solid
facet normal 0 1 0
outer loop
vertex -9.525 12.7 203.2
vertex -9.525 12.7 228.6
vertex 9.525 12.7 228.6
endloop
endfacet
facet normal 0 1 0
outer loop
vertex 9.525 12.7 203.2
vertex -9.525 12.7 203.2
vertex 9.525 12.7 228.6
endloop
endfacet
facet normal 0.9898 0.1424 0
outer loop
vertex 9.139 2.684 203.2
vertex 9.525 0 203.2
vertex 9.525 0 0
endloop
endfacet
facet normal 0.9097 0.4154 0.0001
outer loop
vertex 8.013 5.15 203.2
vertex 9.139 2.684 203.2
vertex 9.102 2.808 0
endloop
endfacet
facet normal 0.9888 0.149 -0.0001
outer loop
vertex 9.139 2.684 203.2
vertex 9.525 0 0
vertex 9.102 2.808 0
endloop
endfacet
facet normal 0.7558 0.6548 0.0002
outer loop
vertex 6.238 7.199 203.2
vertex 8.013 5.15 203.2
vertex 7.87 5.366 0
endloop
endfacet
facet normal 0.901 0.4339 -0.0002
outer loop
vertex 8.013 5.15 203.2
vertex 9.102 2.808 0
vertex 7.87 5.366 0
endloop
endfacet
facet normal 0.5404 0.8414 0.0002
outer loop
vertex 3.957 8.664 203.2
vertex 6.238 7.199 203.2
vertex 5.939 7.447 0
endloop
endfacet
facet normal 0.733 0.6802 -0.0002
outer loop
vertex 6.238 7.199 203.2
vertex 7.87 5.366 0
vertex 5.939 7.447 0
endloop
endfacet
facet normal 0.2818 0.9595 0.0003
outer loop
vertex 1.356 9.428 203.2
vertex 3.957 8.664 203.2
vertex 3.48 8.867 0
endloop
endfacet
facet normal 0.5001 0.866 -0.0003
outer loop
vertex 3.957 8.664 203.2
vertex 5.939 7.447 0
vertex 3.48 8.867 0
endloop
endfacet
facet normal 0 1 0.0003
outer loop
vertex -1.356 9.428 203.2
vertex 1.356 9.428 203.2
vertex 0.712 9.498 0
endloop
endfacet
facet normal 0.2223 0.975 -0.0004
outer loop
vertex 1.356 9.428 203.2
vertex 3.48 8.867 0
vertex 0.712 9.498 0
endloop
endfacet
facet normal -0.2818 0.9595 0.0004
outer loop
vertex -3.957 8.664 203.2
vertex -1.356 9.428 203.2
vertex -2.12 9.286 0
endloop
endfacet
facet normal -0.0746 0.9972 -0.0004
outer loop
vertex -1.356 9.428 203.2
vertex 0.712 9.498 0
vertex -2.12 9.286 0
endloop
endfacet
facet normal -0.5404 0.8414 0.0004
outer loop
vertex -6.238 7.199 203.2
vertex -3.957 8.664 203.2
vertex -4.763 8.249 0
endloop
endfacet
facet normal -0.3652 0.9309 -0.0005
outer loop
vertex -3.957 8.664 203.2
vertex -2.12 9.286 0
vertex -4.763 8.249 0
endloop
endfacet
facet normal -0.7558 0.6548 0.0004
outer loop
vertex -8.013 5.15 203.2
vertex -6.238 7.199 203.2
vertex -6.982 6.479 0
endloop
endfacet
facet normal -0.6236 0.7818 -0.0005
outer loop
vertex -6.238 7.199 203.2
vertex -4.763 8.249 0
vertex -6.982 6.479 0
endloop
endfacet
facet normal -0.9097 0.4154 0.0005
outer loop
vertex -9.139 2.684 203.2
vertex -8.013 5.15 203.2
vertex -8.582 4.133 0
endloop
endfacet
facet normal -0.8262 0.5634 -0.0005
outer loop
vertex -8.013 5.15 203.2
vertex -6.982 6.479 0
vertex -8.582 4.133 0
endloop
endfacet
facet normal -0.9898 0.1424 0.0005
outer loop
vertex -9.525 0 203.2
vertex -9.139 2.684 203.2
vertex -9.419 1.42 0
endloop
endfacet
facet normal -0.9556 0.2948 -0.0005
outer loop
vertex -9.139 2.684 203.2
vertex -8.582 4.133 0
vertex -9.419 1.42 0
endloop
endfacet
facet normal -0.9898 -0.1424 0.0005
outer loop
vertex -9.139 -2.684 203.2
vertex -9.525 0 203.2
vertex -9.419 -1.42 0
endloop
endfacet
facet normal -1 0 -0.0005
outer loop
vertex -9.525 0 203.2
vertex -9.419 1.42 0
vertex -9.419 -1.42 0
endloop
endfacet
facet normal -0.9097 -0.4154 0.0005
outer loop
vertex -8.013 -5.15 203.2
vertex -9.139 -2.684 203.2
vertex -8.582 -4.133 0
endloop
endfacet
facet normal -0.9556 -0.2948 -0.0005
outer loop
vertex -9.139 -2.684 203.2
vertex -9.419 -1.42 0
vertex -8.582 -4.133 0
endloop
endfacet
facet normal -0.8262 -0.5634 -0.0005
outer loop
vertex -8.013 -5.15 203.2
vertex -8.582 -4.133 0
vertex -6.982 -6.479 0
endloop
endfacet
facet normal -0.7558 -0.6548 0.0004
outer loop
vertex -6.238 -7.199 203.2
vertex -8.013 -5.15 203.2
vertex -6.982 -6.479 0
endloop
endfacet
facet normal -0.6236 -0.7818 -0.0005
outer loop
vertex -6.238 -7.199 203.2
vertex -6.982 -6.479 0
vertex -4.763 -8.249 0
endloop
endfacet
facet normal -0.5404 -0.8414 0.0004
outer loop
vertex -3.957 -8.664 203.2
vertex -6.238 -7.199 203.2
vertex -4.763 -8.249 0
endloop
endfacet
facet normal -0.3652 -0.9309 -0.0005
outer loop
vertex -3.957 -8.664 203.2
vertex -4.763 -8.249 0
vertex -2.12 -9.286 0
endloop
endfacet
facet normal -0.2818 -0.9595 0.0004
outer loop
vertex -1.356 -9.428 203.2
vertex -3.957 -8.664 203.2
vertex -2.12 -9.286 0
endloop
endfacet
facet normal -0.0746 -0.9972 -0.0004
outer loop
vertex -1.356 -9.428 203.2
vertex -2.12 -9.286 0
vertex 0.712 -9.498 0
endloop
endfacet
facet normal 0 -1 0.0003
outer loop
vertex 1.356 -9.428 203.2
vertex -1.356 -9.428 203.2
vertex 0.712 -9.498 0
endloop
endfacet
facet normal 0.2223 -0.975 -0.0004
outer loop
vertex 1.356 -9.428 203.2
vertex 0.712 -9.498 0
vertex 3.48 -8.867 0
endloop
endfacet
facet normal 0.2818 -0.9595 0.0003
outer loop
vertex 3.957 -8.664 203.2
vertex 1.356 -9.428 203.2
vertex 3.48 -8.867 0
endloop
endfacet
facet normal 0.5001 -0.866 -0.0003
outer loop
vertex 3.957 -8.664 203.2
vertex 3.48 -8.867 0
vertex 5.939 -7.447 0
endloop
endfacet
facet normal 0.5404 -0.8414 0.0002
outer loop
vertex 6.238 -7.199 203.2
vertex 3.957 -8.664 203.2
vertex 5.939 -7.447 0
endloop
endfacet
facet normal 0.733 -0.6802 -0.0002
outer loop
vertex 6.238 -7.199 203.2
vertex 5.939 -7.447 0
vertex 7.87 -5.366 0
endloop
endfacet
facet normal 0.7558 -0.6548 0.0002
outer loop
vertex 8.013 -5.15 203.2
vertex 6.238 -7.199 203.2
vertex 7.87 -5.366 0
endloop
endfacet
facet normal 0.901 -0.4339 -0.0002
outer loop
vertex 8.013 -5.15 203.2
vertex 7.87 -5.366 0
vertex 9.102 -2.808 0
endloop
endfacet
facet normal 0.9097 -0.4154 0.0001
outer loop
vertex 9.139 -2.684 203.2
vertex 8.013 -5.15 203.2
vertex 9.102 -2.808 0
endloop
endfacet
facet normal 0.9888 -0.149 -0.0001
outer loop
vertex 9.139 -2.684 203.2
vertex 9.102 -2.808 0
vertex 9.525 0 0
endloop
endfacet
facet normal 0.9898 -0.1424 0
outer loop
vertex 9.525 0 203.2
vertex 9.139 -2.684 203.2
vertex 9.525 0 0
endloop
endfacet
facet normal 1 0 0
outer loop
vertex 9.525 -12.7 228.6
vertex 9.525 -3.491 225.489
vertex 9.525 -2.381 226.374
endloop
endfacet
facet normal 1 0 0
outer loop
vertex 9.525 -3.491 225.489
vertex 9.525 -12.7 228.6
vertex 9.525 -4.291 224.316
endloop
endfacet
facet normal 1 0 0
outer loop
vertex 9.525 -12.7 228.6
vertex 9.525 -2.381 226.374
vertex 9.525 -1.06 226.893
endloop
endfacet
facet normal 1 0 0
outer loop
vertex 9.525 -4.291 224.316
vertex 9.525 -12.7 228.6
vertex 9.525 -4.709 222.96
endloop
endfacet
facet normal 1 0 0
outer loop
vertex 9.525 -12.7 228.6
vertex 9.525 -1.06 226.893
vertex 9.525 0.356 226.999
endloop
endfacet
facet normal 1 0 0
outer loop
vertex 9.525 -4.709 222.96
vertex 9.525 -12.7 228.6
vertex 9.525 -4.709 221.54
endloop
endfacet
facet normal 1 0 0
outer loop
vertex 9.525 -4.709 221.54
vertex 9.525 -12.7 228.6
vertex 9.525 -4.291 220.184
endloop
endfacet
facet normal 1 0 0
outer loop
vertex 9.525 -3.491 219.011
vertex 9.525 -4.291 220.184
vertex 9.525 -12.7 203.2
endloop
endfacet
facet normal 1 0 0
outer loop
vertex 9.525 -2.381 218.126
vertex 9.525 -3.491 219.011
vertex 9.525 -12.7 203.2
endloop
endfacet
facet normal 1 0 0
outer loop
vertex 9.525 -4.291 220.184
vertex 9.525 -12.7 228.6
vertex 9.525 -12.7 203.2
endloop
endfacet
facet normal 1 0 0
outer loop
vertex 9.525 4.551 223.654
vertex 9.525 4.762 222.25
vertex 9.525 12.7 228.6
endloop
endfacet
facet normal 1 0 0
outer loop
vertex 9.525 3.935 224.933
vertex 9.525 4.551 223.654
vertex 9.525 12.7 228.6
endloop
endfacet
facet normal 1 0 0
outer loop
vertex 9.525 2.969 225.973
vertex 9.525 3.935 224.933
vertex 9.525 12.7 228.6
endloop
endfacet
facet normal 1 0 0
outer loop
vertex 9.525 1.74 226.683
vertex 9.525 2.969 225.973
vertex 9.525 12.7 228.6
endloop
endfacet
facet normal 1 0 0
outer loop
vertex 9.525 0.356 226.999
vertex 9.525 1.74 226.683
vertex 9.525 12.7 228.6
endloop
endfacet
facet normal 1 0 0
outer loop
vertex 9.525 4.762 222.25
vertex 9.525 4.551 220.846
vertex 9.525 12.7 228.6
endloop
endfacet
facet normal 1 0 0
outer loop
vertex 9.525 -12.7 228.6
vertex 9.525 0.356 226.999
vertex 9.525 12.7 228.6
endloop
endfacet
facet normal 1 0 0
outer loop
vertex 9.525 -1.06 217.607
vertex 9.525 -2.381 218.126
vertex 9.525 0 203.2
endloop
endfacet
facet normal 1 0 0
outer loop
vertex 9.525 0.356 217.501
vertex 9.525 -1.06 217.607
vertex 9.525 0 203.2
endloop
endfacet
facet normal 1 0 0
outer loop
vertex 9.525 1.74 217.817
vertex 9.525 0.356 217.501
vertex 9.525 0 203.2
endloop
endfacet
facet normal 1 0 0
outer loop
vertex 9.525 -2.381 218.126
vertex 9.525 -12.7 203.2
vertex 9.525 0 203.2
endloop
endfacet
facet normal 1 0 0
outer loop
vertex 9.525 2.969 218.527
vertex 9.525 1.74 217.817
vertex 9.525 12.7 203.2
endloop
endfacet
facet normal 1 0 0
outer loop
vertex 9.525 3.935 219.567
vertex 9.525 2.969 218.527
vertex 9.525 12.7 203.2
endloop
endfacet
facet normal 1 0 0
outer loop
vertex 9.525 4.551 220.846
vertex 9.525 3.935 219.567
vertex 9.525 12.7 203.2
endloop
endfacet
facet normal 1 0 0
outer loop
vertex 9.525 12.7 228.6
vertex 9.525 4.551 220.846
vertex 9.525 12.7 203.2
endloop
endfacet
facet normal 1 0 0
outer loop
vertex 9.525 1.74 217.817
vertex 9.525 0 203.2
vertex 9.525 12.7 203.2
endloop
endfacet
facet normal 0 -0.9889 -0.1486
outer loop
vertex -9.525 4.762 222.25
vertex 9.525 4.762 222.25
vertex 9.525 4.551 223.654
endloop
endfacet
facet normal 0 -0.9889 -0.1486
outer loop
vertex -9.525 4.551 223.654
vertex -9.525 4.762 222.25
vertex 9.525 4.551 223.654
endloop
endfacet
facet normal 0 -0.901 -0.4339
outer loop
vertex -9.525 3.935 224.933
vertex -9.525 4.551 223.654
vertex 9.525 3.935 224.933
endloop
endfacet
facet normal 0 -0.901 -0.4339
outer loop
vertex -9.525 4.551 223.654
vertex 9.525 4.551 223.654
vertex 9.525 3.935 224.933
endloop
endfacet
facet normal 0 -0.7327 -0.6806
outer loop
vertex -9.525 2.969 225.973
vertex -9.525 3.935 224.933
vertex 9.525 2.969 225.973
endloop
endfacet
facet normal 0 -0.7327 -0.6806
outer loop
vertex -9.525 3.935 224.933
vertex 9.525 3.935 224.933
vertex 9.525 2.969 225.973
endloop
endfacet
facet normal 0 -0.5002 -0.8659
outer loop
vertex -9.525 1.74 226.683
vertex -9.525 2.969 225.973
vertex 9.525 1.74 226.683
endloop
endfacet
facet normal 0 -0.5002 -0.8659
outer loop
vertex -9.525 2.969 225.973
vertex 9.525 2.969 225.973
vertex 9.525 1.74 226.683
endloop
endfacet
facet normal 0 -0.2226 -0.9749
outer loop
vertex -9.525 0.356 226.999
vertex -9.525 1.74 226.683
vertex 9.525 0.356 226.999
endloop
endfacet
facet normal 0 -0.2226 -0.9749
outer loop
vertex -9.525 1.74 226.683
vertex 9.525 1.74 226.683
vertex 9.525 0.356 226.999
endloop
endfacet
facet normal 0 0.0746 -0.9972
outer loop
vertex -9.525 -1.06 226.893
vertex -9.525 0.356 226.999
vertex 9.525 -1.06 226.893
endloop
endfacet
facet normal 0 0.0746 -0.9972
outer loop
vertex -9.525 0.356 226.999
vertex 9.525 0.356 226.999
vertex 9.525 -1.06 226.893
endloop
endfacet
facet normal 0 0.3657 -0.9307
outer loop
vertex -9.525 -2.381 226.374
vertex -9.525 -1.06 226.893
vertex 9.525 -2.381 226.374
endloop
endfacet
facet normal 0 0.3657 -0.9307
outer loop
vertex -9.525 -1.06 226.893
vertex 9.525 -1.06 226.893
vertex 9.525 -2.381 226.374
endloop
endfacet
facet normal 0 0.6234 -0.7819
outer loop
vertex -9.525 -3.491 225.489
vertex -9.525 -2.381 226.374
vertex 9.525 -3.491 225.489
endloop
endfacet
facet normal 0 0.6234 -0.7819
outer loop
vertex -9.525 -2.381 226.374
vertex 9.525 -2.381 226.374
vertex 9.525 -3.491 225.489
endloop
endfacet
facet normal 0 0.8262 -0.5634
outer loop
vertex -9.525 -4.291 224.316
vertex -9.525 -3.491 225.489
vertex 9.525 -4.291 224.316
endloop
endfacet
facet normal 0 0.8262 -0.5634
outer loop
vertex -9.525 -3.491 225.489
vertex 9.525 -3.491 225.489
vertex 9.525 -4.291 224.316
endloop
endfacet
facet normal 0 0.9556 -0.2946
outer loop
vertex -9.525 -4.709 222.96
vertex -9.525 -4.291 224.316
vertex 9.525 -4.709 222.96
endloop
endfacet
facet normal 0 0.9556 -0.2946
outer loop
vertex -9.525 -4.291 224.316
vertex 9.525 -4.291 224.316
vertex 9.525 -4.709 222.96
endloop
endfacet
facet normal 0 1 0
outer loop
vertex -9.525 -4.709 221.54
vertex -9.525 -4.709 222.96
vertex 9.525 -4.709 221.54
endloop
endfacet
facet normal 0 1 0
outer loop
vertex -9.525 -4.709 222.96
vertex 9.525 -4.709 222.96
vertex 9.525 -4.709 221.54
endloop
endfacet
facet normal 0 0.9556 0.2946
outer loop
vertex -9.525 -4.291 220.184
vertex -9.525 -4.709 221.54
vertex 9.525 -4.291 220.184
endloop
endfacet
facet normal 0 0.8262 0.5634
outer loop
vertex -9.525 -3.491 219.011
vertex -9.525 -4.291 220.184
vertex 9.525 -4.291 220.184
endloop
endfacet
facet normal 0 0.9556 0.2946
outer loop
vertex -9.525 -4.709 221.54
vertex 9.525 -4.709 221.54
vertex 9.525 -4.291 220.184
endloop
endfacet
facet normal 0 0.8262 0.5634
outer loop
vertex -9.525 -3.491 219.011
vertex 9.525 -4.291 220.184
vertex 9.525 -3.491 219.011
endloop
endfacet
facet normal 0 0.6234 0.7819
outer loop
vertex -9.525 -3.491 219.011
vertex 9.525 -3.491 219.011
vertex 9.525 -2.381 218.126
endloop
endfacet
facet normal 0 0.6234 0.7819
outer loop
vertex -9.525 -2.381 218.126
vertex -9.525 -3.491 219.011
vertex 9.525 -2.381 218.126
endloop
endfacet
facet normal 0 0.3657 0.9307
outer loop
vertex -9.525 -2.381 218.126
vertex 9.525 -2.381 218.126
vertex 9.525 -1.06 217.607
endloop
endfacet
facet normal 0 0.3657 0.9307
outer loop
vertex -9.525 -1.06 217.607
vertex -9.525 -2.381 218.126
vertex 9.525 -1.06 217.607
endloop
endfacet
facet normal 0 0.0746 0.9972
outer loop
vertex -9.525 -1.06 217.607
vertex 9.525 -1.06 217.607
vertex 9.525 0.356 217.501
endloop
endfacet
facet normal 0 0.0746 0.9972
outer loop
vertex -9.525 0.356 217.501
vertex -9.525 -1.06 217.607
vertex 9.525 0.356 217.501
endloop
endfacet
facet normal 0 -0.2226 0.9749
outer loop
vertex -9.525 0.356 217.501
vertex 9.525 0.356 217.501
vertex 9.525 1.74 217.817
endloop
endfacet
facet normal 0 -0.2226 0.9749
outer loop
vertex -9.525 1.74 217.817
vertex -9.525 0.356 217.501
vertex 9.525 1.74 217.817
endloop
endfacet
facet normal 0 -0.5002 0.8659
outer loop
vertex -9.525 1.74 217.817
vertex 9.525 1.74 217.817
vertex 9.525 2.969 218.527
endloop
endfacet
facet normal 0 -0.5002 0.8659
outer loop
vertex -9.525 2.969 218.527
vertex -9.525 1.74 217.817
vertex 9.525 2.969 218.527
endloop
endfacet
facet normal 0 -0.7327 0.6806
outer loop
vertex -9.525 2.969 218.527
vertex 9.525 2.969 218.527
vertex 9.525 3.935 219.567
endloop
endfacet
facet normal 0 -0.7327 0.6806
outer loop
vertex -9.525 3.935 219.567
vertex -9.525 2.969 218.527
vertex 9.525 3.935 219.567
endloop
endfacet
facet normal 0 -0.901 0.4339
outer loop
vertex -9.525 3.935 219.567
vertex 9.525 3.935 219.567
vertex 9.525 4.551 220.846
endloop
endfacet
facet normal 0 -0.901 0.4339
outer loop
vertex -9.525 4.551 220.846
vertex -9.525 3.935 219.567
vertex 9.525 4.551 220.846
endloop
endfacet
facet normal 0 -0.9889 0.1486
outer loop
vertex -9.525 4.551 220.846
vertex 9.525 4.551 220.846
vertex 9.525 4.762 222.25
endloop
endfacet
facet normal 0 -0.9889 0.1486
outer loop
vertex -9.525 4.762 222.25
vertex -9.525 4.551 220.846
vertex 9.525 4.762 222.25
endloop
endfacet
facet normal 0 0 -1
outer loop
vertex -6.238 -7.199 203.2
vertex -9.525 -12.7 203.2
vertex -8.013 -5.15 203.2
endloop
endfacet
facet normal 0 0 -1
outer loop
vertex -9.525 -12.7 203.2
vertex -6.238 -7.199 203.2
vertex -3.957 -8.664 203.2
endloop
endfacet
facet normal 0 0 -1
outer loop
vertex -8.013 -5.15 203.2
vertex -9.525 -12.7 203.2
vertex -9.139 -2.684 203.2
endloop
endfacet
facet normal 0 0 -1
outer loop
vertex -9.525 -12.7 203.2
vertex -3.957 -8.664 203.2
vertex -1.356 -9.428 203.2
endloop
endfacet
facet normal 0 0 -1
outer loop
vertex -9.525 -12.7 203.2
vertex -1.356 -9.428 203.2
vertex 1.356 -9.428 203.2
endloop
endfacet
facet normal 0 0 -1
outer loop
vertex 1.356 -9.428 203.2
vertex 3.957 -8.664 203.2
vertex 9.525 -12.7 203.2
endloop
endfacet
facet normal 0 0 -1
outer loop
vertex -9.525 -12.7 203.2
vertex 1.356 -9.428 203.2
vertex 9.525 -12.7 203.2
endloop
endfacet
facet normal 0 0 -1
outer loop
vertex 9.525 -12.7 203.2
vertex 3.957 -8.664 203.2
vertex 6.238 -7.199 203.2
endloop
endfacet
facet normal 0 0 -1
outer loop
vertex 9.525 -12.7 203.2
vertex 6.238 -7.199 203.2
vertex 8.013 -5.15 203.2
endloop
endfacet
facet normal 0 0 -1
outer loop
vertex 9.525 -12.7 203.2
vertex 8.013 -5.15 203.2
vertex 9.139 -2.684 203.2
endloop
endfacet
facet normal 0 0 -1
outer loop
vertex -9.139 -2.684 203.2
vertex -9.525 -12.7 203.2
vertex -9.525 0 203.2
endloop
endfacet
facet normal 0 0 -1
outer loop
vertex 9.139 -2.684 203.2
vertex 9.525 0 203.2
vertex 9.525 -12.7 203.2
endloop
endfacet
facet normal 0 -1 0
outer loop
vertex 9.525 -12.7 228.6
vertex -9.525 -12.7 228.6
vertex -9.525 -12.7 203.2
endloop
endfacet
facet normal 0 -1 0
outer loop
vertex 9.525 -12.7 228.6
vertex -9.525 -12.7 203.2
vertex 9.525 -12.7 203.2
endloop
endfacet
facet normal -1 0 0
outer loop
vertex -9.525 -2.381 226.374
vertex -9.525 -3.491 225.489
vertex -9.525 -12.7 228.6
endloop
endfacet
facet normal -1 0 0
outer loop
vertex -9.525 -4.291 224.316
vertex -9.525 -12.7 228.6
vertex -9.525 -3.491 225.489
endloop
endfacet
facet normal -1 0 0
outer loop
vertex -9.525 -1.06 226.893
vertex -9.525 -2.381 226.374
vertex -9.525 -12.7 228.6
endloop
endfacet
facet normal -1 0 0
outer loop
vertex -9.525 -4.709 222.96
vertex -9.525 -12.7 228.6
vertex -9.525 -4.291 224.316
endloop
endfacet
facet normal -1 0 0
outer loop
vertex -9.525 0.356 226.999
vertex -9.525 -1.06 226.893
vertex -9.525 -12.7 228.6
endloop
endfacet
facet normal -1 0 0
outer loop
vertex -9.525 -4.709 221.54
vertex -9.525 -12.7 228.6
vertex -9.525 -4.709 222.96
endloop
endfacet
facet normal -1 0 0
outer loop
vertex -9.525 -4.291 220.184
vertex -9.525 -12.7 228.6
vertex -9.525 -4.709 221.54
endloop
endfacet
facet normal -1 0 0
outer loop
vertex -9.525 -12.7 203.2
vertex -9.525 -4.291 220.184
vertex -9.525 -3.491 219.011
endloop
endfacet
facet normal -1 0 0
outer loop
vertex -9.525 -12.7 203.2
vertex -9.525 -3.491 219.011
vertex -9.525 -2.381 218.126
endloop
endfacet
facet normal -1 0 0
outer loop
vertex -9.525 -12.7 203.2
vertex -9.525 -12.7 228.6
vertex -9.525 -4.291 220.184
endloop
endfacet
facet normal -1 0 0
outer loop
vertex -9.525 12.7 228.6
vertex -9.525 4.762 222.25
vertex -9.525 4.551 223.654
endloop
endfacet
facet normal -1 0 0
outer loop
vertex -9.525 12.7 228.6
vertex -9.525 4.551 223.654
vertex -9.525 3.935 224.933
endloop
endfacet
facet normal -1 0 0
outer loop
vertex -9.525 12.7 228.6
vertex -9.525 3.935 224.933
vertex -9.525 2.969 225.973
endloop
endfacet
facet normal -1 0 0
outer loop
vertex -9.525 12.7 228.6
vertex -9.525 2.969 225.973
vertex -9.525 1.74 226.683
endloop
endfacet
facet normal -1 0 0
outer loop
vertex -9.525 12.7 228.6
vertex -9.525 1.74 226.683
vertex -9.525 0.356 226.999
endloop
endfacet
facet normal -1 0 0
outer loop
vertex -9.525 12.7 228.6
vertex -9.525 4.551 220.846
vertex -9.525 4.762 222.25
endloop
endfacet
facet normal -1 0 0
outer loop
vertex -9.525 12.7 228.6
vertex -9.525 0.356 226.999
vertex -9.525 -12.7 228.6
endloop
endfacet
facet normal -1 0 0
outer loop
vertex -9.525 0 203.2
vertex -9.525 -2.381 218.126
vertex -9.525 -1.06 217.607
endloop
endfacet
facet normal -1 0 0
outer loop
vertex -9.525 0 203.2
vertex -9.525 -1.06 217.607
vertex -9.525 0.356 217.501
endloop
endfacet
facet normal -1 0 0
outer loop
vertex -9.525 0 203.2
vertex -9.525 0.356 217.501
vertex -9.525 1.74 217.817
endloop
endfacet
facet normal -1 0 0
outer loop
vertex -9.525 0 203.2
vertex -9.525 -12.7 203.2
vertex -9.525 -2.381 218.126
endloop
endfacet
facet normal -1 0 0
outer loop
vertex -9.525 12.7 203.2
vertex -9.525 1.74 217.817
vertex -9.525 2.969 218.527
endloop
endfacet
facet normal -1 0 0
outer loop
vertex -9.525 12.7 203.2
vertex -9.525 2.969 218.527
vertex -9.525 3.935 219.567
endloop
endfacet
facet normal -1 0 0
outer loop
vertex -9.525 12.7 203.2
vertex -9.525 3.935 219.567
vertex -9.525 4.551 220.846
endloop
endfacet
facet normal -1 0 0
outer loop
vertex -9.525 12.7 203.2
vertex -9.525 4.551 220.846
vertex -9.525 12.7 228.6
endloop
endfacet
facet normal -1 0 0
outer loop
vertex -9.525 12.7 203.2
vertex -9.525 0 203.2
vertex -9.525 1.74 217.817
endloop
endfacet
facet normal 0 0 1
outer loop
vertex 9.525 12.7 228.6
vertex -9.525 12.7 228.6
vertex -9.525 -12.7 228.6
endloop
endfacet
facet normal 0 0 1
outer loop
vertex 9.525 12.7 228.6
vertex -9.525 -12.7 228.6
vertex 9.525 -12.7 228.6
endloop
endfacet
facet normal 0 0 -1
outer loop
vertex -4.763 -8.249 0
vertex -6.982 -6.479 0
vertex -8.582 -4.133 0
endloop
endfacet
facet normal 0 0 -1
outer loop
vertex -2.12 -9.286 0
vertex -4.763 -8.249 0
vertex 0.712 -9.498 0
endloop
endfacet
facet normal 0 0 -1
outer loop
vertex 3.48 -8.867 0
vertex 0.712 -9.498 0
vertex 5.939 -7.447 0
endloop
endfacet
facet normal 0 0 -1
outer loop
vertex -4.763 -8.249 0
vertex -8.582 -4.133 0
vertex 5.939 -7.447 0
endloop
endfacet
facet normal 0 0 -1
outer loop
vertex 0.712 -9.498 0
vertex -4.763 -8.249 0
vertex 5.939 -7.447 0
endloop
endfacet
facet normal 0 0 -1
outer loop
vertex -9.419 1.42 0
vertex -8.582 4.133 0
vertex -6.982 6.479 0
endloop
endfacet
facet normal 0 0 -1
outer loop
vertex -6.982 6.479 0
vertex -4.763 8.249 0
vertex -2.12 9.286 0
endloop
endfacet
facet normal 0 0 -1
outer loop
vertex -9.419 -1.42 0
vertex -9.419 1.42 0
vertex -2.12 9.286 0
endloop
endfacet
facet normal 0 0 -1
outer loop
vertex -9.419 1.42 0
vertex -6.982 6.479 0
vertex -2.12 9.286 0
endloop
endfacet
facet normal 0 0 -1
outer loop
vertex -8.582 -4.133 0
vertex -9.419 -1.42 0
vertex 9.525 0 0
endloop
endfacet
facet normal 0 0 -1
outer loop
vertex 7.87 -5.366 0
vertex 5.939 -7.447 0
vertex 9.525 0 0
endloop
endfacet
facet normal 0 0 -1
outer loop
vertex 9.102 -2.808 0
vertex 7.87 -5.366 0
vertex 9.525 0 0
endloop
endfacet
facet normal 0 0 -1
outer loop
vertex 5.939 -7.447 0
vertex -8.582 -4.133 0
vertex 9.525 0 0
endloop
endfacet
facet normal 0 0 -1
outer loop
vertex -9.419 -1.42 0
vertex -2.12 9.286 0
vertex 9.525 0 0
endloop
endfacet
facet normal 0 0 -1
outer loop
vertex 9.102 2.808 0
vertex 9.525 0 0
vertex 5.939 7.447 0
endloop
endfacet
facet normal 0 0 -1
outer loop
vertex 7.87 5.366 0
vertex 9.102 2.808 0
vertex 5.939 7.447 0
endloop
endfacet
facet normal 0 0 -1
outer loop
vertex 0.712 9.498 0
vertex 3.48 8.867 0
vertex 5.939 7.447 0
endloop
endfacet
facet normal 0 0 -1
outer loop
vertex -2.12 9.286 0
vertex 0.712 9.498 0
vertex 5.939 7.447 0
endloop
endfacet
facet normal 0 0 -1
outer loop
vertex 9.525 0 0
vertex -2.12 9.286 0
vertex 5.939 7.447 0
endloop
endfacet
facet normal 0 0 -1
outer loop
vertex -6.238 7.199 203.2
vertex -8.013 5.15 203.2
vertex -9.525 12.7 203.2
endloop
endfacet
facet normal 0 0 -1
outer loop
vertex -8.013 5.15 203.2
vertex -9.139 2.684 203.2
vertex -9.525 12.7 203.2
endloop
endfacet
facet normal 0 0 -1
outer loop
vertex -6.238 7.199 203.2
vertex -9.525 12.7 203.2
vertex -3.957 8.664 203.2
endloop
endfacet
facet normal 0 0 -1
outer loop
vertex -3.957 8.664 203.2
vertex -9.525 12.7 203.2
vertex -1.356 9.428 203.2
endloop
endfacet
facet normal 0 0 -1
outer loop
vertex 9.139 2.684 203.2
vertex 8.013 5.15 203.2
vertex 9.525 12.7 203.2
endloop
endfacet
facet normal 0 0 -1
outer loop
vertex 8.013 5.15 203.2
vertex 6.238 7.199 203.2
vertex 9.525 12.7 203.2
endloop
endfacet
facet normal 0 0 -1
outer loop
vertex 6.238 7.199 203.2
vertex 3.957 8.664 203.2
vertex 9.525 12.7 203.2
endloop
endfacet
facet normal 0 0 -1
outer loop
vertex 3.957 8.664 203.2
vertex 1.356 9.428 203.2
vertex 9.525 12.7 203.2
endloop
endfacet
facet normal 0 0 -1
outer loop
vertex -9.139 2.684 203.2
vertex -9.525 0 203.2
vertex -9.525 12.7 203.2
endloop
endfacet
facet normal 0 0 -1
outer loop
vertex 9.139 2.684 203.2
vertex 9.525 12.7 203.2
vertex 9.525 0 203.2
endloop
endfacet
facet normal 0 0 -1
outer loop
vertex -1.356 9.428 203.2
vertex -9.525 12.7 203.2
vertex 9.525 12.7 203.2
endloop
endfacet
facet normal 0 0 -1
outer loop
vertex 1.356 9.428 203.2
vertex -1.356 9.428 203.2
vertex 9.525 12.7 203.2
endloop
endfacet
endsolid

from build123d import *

# Parameters (mm, degrees)
F0_R     = 9.525
F1_DEPTH = 203.2
F2_W     = 19.05
F2_H     = 25.4
F3_DEPTH = 25.4
F4_R     = 4.7625
F5_DEPTH = 19.051


with BuildPart() as f1:
    # F0 (on Top) → F1 (new body)
    with BuildSketch(Plane.XY):
        Circle(F0_R)
    extrude(amount=F1_DEPTH)

    # F2 (on face) → F3 (join)
    with BuildSketch(Plane.XY.offset(203.2)):
        Rectangle(F2_W, F2_H)
    extrude(amount=F3_DEPTH)

    # F4 (on face) → F5 (cut, through all)
    with BuildSketch(Plane.YZ.offset(9.525)):
        with Locations((0, 222.25)):
            Circle(F4_R)
    extrude(amount=-F5_DEPTH, mode=Mode.SUBTRACT)


solid = f1.part
